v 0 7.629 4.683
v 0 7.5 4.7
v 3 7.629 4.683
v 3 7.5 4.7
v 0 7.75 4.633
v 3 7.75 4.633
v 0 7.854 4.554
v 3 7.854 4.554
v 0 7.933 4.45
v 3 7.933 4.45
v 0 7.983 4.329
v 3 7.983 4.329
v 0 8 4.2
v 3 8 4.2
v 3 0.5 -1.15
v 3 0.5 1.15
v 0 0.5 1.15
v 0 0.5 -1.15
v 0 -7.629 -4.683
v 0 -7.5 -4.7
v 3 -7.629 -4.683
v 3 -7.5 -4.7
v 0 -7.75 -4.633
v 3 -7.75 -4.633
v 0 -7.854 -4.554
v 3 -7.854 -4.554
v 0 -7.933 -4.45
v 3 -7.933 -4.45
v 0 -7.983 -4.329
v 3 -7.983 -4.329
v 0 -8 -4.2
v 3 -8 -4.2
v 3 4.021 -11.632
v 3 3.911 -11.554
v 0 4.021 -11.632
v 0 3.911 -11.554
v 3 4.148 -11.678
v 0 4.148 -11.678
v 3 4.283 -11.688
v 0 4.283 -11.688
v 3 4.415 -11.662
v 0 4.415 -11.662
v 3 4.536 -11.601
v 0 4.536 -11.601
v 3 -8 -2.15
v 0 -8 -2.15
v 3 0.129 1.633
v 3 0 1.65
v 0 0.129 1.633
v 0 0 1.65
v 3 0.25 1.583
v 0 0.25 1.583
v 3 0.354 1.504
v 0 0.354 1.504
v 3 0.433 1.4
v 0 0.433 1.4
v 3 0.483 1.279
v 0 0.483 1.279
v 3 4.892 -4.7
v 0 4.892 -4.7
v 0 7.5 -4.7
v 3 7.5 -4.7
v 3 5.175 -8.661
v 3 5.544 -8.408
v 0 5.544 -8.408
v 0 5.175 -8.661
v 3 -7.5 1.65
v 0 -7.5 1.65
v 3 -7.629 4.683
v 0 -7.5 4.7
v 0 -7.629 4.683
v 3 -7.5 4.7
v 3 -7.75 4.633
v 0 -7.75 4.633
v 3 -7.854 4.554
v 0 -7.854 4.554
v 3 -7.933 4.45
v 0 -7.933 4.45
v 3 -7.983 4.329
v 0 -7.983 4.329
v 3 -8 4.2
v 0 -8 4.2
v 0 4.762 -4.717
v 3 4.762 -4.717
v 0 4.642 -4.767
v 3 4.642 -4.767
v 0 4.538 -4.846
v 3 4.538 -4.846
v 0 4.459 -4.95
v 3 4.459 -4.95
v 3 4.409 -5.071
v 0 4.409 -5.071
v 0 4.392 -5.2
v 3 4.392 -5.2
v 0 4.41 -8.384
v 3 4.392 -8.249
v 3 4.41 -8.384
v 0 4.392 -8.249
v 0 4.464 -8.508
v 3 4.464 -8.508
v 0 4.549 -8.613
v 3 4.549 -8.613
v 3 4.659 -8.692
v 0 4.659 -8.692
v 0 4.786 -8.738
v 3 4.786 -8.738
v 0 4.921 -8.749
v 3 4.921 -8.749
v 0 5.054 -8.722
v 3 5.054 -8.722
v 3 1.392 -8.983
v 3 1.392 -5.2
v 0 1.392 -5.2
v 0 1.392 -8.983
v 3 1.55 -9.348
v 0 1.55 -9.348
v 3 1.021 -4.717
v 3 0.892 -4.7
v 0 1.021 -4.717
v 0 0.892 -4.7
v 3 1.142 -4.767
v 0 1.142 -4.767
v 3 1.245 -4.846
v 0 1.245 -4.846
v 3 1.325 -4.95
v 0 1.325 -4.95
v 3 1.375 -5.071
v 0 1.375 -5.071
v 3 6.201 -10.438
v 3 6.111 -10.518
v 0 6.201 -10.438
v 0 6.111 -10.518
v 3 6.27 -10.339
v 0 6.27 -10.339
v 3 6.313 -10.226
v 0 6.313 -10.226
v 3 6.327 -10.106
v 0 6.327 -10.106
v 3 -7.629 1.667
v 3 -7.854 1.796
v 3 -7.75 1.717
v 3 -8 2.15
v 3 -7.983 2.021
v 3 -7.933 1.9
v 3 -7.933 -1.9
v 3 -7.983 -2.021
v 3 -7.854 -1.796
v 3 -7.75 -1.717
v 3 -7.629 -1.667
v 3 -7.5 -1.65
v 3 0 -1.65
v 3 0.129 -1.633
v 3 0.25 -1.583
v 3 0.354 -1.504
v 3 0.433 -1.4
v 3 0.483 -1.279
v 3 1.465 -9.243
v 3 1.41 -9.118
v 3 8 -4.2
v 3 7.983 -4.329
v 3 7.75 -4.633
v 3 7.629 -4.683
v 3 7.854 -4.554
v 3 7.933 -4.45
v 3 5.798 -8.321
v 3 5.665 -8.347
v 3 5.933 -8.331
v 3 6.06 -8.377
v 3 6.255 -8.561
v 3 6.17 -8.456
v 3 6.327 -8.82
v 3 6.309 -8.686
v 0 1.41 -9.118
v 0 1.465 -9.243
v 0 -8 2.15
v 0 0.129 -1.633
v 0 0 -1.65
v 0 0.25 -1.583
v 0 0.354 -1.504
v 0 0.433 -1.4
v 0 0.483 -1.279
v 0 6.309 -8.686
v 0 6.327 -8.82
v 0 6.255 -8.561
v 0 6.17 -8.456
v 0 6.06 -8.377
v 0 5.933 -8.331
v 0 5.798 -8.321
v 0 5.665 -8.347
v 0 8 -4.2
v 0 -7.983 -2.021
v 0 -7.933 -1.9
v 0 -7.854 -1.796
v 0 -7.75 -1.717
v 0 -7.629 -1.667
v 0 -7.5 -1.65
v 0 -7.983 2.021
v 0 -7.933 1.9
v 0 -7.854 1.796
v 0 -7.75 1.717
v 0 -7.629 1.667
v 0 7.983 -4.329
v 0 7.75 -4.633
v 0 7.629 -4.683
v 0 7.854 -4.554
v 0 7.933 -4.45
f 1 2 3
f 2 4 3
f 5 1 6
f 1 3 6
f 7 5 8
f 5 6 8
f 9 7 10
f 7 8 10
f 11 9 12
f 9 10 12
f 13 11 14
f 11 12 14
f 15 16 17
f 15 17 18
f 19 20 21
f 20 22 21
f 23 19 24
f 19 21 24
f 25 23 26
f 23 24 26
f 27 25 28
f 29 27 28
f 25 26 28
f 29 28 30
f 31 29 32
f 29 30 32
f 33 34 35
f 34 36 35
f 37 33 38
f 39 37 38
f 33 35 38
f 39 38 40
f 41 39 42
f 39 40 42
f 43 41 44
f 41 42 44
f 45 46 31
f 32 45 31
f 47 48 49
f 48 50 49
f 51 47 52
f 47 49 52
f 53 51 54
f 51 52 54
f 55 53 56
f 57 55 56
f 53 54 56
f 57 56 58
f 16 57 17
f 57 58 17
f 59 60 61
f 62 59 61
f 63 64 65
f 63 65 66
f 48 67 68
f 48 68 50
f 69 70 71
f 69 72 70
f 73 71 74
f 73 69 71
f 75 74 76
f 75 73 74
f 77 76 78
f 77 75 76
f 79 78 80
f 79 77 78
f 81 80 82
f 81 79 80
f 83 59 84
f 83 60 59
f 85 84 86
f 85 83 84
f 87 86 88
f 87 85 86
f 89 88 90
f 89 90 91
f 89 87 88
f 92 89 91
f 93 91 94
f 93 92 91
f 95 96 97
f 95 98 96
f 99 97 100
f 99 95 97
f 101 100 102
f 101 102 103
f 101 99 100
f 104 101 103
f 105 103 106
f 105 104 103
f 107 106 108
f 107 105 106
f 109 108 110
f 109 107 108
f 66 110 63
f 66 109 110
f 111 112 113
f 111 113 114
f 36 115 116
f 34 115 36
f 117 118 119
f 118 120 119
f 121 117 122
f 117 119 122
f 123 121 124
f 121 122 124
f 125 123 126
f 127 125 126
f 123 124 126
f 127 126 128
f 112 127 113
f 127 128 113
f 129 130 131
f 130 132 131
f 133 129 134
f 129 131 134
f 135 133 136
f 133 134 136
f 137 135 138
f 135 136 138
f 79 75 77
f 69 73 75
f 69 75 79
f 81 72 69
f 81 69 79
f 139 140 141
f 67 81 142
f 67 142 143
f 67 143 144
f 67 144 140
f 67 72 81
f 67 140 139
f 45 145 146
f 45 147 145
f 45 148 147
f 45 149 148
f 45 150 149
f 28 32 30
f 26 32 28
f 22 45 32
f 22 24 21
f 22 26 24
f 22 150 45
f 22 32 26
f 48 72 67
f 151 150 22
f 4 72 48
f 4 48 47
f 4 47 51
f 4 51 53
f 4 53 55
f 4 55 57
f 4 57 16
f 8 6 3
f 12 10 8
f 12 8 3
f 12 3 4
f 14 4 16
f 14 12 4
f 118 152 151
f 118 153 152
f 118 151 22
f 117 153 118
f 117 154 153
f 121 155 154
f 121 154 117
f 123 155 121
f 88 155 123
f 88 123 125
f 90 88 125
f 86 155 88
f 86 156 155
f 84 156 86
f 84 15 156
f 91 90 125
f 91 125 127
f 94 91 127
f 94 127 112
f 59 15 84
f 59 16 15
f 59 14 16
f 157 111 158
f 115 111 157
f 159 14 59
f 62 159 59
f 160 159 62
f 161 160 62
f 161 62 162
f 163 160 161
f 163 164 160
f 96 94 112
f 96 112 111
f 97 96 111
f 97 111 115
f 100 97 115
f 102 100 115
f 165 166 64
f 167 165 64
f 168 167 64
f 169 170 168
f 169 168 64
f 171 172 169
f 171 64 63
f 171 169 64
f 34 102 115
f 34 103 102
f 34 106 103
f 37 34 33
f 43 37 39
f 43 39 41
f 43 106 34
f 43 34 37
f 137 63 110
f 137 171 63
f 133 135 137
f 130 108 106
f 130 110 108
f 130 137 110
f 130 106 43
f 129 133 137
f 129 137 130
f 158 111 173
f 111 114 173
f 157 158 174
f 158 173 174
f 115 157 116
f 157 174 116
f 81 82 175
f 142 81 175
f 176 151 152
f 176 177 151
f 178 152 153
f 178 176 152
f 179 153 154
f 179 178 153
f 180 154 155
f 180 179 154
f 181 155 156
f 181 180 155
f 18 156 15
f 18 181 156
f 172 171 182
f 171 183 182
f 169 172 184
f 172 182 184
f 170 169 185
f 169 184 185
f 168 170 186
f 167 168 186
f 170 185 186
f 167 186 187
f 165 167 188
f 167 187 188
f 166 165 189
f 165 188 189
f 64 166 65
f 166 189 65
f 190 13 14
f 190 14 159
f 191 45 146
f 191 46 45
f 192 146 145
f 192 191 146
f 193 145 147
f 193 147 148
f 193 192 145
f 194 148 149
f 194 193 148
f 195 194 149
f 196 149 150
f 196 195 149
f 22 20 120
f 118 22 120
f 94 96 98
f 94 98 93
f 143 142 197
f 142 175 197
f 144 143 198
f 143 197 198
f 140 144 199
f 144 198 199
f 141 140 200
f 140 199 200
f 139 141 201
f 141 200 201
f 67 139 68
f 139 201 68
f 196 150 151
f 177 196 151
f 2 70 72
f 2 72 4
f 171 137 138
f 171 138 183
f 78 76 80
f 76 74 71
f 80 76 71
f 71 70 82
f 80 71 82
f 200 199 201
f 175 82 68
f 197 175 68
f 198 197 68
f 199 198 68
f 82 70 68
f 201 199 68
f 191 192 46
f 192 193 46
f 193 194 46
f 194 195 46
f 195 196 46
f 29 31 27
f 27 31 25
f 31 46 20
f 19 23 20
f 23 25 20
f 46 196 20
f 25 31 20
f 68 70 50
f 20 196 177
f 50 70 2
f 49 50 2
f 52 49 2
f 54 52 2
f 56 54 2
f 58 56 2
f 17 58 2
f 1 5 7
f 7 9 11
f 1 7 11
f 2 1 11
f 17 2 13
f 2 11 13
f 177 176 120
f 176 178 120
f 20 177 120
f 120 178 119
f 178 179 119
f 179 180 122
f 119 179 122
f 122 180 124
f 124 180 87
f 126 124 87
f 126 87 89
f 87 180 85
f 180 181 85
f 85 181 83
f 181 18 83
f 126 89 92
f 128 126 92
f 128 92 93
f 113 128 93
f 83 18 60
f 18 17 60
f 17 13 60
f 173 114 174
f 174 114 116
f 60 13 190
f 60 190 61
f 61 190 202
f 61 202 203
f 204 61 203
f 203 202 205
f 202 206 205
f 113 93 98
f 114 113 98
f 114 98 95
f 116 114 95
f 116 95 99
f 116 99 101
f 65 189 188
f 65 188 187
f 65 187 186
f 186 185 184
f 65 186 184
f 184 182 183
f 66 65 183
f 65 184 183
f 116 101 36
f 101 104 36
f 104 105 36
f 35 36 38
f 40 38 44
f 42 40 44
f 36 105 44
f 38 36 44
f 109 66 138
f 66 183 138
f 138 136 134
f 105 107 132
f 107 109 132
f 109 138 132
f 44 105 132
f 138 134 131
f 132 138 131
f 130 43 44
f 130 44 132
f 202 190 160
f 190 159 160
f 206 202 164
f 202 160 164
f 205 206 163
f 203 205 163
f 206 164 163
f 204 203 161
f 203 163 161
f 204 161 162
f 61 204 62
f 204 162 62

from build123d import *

# Parameters (mm, degrees)
CROQUIS1_W              = 9.4
CROQUIS1_H              = 16
SALIENTE_EXTRUIR1_DEPTH = 3
CROQUIS2_W              = 3.3
CROQUIS2_H              = 8.5
CORTAR_EXTRUIR1_DEPTH   = 3
SALIENTE_EXTRUIR2_DEPTH = 3
REDONDEO1_R             = 0.5


with BuildPart() as part:
    # Croquis1 → Saliente-Extruir1 (new body)
    with BuildSketch(Plane(origin=(0, 0, 0), x_dir=(0, 0, -1), z_dir=(1, 0, 0))):
        Rectangle(CROQUIS1_W, CROQUIS1_H)
    extrude(amount=SALIENTE_EXTRUIR1_DEPTH)

    # Croquis2 → Cortar-Extruir1 (cut)
    with BuildSketch(Plane(origin=(3, 0, 0), x_dir=(0, 0, -1), z_dir=(1, 0, 0))):
        with Locations((0, -3.75)):
            Rectangle(CROQUIS2_W, CROQUIS2_H)
    extrude(amount=-CORTAR_EXTRUIR1_DEPTH, mode=Mode.SUBTRACT)

    # Croquis4 → Saliente-Extruir2 (add)
    with BuildSketch(Plane(origin=(3, 0, 0), x_dir=(0, 0, -1), z_dir=(1, 0, 0))):
        Polygon((4.7, 4.391798286), (4.7, 1.391798286), (9.2, 1.391798286), (11.82874383, 4.204558046), (10.369105711, 6.327401467), (7.869105711, 6.327401467), (9.2, 4.391798286), align=None)
    extrude(amount=-SALIENTE_EXTRUIR2_DEPTH)

    # Redondeo1
    redondeo1_edges = [part.edges().sort_by_distance(p)[0] for p in [
        (1.5, -8, 1.65),
        (1.5, 0.5, 1.65),
        (1.5, 0.5, -1.65),
        (1.5, -8, -1.65),
        (1.5, 4.391798286, -4.7),
        (1.5, 4.391798286, -9.2),
        (1.5, 6.327401467, -7.869105711),
        (1.5, 6.327401467, -10.369105711),
        (1.5, 4.204558046, -11.82874383),
        (1.5, 1.391798286, -9.2),
        (1.5, 1.391798286, -4.7),
        (1.5, 8, 4.7),
        (1.5, 8, -4.7),
        (1.5, -8, -4.7),
        (1.5, -8, 4.7),
    ]]
    fillet(redondeo1_edges, radius=REDONDEO1_R)


solid = part.part
